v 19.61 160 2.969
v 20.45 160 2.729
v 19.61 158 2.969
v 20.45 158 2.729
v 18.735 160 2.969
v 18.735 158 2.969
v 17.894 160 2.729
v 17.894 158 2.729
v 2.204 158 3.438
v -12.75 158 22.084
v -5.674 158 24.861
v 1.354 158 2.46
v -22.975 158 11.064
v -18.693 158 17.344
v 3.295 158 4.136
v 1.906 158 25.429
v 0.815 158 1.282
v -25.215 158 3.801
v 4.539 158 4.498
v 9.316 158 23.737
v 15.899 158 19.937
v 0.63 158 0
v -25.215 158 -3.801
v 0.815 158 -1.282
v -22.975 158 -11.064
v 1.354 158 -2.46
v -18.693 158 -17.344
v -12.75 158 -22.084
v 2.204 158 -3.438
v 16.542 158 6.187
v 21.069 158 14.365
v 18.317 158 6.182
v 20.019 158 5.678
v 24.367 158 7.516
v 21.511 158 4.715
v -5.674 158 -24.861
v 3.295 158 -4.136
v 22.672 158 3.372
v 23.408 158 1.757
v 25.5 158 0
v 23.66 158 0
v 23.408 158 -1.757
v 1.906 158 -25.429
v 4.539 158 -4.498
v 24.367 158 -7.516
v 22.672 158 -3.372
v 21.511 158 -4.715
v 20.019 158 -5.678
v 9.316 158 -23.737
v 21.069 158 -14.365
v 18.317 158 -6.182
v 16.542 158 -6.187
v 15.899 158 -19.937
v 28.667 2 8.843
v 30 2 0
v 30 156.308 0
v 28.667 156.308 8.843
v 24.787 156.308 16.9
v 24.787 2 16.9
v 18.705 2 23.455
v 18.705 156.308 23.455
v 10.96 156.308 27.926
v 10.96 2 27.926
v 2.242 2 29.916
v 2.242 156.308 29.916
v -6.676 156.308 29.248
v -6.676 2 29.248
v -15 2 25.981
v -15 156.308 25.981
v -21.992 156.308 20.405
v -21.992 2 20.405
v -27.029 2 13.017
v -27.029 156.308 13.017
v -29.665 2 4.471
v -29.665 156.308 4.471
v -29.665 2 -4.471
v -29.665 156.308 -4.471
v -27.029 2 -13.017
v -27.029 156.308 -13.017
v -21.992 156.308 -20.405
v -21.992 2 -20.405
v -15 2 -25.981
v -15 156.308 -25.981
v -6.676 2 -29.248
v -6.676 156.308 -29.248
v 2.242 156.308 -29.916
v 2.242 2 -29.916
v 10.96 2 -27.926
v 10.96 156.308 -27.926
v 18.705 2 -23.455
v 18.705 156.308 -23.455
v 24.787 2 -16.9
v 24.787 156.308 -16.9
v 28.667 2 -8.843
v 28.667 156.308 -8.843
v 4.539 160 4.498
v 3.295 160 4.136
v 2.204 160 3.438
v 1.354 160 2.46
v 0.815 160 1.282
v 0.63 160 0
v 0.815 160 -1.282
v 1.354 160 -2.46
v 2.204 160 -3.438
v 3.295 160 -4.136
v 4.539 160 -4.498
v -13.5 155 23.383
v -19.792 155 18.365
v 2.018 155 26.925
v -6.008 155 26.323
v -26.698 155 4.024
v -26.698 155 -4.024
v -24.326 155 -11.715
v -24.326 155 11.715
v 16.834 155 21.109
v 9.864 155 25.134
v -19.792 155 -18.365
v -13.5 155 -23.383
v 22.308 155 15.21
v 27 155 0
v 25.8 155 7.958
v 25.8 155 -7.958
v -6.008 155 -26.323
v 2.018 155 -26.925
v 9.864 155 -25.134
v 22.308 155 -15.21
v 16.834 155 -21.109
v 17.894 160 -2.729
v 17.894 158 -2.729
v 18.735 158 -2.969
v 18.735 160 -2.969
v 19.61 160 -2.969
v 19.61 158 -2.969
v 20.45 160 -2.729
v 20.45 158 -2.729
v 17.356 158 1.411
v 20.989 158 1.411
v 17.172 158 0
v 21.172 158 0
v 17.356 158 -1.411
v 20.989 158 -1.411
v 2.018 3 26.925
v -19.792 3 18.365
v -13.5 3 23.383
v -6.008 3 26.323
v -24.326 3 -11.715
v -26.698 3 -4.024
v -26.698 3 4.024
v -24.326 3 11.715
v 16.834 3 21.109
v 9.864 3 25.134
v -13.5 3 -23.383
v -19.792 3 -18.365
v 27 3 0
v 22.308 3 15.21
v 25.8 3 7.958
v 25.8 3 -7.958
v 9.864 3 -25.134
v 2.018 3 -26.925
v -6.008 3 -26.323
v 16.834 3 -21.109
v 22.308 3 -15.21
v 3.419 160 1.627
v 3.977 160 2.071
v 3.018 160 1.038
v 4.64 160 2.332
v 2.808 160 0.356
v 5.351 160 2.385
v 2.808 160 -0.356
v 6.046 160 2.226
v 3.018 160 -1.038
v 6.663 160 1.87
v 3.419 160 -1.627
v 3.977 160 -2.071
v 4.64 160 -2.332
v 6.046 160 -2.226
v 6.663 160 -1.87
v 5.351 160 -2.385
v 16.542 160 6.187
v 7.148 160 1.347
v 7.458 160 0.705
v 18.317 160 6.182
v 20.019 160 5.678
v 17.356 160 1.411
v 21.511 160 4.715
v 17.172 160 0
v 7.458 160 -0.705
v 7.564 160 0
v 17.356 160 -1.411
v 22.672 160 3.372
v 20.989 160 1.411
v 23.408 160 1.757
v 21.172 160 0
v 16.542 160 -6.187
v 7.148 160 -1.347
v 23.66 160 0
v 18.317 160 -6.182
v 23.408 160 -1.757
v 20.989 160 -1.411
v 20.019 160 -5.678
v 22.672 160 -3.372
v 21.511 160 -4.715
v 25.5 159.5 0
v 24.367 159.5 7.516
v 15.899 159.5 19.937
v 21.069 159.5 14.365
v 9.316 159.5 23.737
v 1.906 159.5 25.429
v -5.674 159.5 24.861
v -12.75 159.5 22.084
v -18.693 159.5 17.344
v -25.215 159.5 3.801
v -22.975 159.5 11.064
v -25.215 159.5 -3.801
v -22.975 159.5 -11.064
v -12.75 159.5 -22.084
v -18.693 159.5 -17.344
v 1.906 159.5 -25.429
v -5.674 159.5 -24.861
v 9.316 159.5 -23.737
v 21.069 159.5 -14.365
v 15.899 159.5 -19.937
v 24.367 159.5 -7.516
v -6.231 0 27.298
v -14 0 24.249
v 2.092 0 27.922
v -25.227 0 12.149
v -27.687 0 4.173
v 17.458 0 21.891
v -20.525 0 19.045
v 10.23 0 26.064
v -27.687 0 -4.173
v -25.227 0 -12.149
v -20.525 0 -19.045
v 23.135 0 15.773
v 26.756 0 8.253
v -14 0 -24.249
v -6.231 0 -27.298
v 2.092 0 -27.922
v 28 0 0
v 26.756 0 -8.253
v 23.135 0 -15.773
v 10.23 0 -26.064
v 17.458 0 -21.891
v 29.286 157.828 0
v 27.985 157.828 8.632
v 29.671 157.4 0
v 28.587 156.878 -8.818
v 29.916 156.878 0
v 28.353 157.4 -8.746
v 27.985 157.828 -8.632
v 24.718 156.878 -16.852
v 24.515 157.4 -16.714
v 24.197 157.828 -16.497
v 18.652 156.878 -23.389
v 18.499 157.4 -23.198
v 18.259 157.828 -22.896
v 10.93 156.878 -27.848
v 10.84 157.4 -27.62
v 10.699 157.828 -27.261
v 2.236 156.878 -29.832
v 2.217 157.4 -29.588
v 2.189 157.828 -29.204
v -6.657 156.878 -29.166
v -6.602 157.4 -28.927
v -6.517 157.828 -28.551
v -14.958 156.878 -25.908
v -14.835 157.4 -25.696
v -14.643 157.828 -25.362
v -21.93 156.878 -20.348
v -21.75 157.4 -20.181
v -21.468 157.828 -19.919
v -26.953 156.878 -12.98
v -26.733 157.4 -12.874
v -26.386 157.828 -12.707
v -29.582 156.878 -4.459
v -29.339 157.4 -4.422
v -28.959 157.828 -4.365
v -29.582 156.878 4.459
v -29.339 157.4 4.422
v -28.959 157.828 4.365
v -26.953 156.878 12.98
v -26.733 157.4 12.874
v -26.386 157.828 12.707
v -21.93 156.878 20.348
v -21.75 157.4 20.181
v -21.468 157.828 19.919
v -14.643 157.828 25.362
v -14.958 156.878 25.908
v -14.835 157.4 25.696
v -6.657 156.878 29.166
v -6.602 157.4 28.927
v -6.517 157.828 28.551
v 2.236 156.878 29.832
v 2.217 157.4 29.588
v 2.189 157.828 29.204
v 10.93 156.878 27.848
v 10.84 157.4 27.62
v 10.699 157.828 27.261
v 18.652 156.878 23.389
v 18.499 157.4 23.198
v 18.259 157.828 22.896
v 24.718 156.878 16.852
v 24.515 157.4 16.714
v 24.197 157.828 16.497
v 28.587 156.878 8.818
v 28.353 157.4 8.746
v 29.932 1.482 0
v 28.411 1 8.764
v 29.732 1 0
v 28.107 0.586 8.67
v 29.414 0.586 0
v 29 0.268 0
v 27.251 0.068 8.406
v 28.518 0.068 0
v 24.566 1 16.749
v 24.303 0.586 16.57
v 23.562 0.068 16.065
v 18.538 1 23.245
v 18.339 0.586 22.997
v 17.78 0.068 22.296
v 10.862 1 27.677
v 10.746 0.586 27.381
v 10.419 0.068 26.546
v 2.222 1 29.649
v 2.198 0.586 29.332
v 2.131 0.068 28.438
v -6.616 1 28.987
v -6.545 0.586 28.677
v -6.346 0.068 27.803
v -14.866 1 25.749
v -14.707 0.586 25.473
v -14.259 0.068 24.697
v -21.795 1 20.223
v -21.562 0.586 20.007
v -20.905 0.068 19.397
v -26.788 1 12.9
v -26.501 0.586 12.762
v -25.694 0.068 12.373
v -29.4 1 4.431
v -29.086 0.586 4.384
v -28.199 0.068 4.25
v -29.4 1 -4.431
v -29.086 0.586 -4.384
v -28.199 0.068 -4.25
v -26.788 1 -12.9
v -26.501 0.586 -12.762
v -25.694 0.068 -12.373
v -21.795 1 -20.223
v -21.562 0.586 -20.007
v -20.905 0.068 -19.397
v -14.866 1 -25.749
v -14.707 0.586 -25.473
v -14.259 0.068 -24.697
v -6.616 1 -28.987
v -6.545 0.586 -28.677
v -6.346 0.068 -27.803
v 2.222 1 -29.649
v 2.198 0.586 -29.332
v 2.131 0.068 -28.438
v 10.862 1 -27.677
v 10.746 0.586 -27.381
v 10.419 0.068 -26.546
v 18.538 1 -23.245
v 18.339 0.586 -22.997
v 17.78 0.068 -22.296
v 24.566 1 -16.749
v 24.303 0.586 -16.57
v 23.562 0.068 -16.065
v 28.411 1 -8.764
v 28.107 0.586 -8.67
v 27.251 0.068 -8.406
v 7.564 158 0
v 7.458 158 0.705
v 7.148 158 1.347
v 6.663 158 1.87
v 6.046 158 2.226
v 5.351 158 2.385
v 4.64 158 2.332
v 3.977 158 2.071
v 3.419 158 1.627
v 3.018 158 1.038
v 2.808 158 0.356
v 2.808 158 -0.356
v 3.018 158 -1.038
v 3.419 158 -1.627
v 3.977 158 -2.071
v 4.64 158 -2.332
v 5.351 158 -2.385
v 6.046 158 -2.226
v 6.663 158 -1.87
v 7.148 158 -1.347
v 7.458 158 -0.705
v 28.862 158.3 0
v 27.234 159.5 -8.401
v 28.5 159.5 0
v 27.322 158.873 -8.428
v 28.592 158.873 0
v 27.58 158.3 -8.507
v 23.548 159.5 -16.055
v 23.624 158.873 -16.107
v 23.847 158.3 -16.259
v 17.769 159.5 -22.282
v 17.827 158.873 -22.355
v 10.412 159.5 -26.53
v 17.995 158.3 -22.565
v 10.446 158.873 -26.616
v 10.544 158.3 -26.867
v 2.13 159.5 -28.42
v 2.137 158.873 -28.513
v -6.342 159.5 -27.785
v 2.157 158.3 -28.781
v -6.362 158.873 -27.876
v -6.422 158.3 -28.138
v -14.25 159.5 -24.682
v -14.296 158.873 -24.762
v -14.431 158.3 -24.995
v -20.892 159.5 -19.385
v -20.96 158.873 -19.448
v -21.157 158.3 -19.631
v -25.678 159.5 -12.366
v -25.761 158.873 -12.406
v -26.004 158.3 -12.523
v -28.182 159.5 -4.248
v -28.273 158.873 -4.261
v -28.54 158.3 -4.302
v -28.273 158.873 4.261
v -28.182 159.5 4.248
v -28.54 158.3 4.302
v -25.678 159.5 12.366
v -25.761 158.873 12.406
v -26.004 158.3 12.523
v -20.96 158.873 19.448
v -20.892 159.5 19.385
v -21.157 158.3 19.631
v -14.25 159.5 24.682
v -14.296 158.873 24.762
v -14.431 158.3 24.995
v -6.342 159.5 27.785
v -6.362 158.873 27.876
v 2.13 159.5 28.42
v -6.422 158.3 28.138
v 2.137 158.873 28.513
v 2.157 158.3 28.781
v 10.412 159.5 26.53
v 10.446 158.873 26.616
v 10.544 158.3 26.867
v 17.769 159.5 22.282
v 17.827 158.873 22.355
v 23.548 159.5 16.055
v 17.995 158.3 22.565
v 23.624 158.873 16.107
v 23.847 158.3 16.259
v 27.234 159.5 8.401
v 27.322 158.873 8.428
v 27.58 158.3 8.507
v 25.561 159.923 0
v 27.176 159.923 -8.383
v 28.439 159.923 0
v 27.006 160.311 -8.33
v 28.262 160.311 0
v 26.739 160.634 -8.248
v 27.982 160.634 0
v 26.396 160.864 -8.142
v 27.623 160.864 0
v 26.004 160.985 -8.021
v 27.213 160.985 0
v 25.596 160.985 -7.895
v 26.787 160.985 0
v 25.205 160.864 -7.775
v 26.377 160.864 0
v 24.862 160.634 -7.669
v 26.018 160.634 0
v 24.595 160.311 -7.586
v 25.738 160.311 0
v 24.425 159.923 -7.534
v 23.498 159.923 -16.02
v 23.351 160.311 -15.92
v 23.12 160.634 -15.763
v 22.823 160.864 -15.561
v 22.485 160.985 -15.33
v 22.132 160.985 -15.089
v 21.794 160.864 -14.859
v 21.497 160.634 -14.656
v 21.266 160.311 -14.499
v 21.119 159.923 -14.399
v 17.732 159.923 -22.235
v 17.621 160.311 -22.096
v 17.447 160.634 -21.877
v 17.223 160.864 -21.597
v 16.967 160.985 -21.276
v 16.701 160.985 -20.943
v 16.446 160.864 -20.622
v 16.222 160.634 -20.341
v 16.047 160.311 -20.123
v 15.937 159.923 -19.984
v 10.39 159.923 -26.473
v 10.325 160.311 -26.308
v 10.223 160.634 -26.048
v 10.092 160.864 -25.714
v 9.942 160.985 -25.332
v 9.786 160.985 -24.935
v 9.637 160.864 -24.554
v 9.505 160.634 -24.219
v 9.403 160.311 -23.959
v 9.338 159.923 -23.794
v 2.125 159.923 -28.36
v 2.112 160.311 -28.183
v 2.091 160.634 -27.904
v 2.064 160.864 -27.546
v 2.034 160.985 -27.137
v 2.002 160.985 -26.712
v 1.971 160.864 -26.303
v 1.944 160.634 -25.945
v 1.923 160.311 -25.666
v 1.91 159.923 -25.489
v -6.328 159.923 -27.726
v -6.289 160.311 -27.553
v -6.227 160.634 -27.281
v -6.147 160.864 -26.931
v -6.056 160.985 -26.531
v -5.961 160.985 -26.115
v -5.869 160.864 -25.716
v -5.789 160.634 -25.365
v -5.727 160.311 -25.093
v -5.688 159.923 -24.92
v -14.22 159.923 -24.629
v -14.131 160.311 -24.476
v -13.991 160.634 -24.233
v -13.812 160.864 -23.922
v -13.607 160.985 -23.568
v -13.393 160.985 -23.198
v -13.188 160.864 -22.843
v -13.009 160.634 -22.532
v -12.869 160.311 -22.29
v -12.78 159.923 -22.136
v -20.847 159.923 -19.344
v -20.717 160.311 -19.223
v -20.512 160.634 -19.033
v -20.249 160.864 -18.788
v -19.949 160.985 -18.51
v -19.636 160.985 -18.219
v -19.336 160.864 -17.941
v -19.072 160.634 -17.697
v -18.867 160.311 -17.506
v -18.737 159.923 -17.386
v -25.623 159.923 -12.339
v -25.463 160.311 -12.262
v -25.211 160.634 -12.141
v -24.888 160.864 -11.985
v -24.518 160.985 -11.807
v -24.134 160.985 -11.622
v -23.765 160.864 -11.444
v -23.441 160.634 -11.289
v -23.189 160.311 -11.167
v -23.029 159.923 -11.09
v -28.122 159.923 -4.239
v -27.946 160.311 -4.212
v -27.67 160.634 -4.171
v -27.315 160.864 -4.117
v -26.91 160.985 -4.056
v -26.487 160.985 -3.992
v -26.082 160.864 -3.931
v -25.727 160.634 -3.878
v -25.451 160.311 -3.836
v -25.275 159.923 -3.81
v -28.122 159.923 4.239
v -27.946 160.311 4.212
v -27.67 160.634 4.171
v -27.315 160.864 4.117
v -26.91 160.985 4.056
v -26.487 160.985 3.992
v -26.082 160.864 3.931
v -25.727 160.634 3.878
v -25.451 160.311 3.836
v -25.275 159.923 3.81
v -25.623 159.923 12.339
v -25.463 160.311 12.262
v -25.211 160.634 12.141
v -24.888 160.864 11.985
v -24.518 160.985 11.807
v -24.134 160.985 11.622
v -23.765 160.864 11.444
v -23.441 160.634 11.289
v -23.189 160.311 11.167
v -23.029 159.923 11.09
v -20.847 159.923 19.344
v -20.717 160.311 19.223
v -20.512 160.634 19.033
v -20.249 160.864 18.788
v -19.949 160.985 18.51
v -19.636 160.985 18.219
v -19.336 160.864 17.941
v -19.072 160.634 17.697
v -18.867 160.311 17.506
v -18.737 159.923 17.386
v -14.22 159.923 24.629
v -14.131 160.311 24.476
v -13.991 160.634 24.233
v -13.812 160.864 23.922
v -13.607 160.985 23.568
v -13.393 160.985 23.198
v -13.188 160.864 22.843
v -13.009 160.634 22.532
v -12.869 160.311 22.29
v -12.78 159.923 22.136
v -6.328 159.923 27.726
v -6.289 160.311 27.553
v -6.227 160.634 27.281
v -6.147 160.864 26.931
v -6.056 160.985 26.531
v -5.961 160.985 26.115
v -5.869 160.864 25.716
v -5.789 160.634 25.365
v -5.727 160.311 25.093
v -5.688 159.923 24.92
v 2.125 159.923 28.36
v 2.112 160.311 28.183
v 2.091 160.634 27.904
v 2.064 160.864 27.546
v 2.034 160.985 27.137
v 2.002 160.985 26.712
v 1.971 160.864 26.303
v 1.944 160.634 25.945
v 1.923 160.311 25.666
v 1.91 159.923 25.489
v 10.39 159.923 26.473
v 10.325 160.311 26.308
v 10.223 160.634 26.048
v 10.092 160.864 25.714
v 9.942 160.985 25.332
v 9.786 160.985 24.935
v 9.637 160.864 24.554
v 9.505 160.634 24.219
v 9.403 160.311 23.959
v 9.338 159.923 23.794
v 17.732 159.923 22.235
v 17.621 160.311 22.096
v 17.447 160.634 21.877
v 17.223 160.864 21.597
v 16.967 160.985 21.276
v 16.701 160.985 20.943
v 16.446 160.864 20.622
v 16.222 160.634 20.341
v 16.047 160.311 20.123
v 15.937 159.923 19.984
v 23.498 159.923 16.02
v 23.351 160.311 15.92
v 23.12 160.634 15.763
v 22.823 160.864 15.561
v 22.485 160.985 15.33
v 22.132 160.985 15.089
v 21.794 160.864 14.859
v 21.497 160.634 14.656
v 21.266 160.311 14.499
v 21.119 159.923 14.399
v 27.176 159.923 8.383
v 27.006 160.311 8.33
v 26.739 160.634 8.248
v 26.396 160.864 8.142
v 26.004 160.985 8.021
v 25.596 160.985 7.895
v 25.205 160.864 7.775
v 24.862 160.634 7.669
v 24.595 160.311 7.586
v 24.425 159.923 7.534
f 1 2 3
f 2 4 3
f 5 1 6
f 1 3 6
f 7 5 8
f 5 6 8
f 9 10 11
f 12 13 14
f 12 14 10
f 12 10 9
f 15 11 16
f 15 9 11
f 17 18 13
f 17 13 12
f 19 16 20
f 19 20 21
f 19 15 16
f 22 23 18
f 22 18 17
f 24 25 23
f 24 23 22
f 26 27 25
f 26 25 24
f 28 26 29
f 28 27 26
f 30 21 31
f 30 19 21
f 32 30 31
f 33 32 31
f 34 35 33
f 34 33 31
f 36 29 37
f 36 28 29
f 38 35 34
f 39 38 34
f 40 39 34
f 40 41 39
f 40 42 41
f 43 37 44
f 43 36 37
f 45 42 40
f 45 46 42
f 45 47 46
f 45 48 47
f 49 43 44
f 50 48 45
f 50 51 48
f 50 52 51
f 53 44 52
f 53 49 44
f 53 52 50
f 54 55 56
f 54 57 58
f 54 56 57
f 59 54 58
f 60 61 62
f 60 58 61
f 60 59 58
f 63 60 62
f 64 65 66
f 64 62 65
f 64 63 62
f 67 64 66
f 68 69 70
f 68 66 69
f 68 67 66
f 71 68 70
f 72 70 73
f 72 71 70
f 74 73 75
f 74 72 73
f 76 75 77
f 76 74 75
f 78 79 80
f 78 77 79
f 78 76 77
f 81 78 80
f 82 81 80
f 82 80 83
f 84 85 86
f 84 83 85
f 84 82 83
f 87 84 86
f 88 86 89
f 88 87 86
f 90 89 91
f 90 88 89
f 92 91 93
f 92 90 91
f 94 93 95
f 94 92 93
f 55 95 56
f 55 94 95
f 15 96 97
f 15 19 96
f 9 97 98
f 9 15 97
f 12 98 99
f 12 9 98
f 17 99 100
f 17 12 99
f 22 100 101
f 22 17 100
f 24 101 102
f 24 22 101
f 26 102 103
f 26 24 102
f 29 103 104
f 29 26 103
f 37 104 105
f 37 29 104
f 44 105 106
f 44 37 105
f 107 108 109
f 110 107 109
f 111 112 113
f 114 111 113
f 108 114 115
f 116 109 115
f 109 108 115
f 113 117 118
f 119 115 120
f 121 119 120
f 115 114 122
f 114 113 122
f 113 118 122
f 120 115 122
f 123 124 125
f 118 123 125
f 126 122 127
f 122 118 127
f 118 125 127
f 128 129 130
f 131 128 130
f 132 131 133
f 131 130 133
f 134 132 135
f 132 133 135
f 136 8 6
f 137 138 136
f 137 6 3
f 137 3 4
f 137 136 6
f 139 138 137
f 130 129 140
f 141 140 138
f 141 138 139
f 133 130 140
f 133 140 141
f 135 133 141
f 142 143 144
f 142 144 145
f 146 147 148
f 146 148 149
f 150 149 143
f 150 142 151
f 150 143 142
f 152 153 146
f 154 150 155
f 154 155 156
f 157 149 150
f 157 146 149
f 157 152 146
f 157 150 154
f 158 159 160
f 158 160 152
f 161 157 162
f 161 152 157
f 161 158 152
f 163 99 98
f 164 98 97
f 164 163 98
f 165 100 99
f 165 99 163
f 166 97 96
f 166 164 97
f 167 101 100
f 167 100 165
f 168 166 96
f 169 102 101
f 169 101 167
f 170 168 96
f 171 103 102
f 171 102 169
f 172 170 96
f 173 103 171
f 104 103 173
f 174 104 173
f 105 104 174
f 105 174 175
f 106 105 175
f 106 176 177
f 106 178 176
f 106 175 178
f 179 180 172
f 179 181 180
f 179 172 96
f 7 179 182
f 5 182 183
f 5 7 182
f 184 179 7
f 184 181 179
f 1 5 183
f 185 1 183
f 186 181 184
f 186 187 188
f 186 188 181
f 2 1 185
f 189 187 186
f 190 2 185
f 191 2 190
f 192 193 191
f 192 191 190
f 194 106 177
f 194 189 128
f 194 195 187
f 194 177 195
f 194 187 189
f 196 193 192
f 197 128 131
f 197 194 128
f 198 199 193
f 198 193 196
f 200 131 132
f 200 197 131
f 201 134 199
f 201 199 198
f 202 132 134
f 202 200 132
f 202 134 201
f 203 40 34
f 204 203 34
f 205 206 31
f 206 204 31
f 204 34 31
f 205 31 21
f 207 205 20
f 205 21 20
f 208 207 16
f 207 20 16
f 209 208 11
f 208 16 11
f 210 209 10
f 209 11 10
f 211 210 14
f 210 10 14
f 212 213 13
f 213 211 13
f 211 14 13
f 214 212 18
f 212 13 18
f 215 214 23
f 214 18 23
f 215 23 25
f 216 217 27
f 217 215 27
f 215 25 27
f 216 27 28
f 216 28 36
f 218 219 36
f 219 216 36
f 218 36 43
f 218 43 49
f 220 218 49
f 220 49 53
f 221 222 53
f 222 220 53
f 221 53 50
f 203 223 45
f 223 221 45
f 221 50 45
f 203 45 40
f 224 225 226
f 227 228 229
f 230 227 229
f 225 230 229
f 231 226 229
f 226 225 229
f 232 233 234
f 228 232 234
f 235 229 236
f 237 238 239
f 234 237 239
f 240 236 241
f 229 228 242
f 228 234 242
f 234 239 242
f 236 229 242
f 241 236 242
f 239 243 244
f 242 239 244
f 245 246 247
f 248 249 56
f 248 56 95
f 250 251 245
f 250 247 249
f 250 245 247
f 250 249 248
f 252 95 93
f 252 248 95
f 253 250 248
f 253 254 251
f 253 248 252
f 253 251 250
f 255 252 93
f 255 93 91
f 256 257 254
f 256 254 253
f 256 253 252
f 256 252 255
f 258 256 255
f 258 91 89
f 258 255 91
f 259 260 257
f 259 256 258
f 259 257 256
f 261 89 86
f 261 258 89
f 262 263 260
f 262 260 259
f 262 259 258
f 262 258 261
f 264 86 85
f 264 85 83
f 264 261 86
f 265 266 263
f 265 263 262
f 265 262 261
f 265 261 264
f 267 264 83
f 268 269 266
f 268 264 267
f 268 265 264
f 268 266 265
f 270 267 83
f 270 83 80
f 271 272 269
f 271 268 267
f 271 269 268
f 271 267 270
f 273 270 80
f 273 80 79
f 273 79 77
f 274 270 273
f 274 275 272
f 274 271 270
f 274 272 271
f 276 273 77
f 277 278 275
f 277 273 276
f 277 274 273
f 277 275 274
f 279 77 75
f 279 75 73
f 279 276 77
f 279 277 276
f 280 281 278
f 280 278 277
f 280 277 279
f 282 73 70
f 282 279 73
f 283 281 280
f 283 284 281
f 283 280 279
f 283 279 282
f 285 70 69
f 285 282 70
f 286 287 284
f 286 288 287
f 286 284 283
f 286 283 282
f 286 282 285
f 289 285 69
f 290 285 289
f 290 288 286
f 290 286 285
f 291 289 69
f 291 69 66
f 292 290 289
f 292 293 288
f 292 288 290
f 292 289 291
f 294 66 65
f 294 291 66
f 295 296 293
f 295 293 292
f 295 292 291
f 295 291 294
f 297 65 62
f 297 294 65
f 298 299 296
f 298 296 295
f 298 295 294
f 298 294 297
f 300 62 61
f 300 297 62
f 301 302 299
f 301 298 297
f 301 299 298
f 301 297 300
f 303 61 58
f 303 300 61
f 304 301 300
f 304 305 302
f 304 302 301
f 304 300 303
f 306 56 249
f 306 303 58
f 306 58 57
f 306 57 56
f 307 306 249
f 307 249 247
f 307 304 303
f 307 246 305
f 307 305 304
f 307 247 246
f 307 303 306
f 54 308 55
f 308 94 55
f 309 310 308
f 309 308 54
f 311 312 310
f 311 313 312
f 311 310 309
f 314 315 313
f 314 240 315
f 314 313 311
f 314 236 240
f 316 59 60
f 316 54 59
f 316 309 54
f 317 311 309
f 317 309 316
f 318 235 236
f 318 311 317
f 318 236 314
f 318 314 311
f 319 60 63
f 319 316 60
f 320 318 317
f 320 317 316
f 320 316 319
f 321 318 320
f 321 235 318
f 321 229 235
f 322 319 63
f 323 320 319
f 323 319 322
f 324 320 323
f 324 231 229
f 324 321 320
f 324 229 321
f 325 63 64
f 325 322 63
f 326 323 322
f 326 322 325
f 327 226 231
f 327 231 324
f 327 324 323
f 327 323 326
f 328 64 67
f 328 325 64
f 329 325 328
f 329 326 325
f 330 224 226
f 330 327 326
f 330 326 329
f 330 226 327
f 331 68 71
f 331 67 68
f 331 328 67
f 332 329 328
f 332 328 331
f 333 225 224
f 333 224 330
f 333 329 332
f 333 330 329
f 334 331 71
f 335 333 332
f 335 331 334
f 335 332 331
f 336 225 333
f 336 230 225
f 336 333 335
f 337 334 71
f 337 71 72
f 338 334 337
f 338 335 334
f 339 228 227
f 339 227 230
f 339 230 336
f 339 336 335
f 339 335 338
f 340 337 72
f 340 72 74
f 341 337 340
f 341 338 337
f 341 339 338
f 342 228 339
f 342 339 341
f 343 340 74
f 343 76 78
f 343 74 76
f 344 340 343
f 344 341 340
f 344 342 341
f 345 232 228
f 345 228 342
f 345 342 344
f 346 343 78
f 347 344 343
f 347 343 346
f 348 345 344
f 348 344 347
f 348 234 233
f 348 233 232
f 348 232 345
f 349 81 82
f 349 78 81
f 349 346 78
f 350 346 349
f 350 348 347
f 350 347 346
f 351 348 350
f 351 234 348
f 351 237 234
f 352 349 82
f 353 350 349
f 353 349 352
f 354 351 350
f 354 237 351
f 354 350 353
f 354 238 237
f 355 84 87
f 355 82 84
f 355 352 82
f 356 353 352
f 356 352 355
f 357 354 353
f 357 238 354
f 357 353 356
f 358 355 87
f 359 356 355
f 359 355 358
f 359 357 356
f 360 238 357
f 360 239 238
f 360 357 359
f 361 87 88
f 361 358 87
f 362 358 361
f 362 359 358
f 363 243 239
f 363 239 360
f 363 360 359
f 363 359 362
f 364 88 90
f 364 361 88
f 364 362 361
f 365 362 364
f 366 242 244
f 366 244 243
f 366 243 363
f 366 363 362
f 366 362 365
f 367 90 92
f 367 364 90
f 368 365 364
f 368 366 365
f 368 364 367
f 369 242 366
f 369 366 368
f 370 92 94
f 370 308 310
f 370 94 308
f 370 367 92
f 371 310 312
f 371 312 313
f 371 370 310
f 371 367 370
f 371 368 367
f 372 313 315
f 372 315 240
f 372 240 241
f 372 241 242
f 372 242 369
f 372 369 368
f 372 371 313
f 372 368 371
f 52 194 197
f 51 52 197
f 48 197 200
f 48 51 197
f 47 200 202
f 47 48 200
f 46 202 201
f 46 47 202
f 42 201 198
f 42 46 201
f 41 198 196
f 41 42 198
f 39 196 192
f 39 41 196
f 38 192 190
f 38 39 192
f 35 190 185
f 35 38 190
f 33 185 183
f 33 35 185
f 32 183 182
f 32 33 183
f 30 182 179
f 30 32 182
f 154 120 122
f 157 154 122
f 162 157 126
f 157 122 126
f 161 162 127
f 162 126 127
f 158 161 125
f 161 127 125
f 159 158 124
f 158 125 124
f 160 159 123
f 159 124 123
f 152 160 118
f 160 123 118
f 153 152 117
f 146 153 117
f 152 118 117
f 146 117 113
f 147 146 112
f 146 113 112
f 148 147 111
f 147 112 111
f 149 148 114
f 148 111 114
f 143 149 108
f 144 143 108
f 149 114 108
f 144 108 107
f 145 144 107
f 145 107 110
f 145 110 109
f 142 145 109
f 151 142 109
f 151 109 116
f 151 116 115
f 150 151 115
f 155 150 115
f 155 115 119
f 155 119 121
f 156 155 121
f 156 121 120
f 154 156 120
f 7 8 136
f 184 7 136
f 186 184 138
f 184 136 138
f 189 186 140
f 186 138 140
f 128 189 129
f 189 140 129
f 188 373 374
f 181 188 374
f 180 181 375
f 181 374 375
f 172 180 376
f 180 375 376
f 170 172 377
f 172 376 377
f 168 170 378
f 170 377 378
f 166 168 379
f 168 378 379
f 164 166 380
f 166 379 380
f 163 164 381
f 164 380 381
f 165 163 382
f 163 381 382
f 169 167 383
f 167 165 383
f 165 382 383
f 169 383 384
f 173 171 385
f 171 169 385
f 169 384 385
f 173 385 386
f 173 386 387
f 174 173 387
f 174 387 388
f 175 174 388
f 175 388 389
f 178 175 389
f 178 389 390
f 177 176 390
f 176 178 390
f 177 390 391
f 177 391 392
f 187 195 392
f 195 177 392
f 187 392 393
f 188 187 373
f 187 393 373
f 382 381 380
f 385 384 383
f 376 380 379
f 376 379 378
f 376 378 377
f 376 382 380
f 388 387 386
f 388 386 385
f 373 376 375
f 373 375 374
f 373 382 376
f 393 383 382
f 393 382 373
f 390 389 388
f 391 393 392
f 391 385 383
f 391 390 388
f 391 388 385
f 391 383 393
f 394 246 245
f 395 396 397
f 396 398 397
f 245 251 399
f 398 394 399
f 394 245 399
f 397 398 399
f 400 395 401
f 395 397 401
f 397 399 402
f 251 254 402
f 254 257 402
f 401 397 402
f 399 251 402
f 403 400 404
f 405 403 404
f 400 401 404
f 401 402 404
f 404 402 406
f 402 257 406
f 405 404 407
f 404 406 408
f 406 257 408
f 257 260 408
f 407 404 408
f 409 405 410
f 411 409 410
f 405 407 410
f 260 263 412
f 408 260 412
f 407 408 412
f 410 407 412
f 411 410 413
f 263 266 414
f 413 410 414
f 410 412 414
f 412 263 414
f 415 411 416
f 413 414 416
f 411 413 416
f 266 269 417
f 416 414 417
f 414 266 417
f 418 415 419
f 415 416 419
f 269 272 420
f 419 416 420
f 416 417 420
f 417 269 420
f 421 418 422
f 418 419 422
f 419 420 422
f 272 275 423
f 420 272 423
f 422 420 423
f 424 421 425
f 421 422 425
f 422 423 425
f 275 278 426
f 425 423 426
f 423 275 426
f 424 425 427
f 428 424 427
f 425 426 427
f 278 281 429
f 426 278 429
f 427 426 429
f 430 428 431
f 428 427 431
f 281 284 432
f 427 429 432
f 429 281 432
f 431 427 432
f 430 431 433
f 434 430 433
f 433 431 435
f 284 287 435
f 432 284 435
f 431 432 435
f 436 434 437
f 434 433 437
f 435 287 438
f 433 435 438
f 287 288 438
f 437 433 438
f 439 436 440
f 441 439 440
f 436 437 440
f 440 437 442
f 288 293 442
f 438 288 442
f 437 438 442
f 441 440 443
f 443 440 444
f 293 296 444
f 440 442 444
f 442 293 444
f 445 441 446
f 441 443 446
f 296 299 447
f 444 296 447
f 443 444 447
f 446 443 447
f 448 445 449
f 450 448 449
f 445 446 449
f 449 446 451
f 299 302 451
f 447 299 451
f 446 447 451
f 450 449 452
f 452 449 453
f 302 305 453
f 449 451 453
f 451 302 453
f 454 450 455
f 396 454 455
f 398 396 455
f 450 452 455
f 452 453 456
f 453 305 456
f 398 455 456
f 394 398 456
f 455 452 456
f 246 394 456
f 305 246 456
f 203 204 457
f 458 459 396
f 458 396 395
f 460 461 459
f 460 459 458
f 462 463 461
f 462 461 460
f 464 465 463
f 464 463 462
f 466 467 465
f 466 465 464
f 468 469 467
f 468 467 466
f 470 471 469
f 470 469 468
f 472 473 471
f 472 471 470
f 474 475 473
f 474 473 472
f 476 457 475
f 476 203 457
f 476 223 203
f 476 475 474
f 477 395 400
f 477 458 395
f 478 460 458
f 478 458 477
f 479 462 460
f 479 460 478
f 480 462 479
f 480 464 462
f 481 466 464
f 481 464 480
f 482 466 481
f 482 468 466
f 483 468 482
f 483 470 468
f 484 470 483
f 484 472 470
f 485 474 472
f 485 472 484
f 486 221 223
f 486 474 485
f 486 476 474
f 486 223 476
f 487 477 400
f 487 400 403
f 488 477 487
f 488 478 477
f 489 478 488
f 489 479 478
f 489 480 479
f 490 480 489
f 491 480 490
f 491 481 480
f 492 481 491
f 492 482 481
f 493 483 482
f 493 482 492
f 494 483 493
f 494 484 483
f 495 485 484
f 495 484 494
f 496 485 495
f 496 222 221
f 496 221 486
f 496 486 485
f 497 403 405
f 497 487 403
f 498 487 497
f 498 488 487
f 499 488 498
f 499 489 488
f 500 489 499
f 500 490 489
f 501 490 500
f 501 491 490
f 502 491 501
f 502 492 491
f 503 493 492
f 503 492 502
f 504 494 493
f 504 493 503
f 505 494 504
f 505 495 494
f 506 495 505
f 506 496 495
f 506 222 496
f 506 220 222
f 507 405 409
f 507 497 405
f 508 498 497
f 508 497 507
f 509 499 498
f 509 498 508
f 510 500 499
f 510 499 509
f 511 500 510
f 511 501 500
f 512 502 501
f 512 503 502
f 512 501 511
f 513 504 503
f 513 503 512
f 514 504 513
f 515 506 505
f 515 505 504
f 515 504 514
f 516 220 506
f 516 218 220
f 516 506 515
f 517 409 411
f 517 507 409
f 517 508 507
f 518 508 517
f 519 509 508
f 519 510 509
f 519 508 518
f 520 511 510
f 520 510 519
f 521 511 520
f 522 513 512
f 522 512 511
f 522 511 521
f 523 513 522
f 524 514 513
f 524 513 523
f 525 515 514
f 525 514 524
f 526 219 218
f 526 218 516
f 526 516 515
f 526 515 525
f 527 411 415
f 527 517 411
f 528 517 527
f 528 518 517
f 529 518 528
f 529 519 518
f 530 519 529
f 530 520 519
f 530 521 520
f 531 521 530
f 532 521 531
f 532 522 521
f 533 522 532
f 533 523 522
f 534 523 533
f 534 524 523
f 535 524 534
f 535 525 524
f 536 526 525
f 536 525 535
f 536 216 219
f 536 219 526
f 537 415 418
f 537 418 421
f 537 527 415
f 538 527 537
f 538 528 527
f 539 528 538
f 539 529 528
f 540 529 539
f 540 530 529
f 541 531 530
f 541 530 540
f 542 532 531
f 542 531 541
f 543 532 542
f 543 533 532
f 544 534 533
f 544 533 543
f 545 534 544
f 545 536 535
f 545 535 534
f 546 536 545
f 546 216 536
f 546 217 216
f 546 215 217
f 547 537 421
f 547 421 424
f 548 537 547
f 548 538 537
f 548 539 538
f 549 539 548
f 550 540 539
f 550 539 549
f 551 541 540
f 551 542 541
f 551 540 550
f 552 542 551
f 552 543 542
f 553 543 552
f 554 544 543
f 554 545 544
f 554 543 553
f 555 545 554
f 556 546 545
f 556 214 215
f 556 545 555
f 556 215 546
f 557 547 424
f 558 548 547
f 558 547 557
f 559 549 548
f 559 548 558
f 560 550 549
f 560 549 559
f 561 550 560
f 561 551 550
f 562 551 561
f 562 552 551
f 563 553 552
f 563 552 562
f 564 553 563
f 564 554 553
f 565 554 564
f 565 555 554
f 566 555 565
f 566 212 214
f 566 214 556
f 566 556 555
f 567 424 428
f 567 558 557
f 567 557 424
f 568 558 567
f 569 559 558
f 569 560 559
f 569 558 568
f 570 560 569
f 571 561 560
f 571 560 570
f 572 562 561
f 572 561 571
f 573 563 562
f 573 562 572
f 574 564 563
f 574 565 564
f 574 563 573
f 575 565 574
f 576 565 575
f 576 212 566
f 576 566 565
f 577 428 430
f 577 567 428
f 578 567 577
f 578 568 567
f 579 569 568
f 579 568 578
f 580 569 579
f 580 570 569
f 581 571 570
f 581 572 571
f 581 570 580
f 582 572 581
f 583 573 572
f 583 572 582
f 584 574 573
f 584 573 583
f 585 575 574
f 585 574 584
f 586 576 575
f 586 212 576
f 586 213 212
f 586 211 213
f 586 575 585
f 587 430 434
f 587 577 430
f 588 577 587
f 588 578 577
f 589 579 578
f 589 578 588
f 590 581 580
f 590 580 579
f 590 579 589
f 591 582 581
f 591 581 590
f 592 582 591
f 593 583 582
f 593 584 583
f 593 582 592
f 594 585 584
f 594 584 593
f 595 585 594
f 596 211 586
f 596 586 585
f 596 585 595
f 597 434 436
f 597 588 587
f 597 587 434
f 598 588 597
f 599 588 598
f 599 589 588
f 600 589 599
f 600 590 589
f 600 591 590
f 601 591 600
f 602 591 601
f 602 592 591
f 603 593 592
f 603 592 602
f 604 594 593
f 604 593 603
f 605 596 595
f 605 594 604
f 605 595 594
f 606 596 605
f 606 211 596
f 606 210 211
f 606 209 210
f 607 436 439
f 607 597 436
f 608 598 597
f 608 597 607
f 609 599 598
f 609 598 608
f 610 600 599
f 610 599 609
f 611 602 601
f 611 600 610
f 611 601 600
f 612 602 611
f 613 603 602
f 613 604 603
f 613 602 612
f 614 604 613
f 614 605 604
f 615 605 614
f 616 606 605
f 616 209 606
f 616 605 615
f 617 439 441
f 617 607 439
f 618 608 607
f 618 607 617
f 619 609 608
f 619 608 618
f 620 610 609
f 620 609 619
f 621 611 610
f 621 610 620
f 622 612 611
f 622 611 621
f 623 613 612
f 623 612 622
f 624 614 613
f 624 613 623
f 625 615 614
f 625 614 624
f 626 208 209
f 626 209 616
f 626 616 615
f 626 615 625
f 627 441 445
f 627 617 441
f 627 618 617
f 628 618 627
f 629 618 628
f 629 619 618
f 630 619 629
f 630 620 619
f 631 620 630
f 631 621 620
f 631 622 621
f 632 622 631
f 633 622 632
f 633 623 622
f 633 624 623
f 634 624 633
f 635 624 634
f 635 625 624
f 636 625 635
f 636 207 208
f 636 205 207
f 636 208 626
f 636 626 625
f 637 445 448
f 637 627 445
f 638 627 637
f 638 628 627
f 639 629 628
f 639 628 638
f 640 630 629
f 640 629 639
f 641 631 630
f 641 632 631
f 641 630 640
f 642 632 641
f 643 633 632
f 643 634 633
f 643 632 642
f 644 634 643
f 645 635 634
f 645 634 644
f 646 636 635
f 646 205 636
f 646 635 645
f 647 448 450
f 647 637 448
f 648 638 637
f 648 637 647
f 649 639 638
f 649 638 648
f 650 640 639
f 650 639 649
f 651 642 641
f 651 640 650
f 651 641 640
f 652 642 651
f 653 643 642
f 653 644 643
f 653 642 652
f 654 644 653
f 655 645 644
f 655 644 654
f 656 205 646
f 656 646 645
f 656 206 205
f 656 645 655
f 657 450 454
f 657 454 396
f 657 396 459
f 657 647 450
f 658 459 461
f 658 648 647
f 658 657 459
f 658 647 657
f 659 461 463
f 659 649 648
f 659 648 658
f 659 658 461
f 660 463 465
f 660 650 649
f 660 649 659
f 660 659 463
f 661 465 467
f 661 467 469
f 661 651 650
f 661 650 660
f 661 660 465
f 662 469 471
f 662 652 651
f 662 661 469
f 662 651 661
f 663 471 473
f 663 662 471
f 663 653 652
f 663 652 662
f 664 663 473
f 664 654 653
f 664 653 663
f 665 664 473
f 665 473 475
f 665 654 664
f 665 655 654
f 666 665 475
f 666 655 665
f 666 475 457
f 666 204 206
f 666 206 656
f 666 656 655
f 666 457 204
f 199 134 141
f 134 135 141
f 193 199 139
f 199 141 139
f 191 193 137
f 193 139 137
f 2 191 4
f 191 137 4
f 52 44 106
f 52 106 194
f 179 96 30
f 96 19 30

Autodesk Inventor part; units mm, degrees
ref_plane "YZ Plane" through (0, 0, 0) normal (1, 0, 0) x (0, 1, 0)
ref_plane "XZ Plane" through (0, 0, 0) normal (0, 1, 0) x (-1, 0, 0)
ref_plane "XY Plane" through (0, 0, 0) normal (0, 0, 1) x (1, 0, 0)
sketch "Sketch1" plane through (0, 0, 0) normal (0, 0, 1) x (1, 0, 0)
  line L0 (30, 158) -> (30, 0) construction
  line L1 (0, 0) -> (0, 155)
  line L2 (0, 0) -> (30, 0)
  line L3 (30, 0) -> (0, 0) construction
  line L4 (0, 0) -> (0, 3) construction
  line L5 (0, 3) -> (27, 3)
  line L6 (27, 3) -> (27, 155)
  line L7 (27, 155) -> (0, 155)
  line L8 (0, 155) -> (0, 158)
  line L9 (0, 158) -> (30, 158) construction
  line L10 (27, 158) -> (27, 161) construction
  arc A0 (28.5, 159.5) -> (25.5, 159.5) centre (27, 159.5) ccw
  line L11 (28.5, 159.5) -> (28.5, 158) construction
  line L12 (25.5, 159.5) -> (25.5, 158)
  line L13 (27, 155) -> (27, 158) construction
  arc A1 (28.5, 159.5) -> (29.2857, 157.8283) centre (30.6712, 159.5) ccw
  arc A2 (30, 156.3085) -> (29.2857, 157.8283) centre (28.0261, 156.3085) ccw
  line L14 (25.5, 158) -> (0, 158)
  line L15 (30, 156.3085) -> (30, 0)
  point P0 (30, 79)
  dimension "d0" = 60
  dimension "d1" = 158
  dimension "d2" = 3
  dimension "d3" = 27
  dimension "d4" = 3
  dimension "d5" = 3
  dimension "d6" = 1.5
revolve "Revolution1" add sketch "Sketch1" angle 360 about axis through (0, 0, 0) along (0, 1, 0) contours L1 L5 L6 L7 L8 L14 L12 A0 A1 A2 L15 L2
fillet "Fillet1" radius 2 1 edges at (-30, 0, 0)
sketch "Sketch2" plane through (0, 158, 0) normal (0, 1, 0) x (1, 0, 0)
  circle A0 centre (0, 0) radius 25.5 construction
  circle A1 centre (5.1723, 0) radius 4.542 construction
  circle A2 centre (17.4125, 0) radius 6.2476 construction
  line L0 (4.5394, -4.4977) -> (16.5419, -6.1866)
  line L1 (4.5394, 4.4977) -> (16.5419, 6.1866)
  arc A3 (4.5394, 4.4977) -> (4.5394, -4.4977) centre (5.1723, 0) ccw
  arc A4 (16.5419, -6.1866) -> (16.5419, 6.1866) centre (17.4125, 0) ccw
  circle A5 centre (5.1723, 0) radius 2.3915
  arc A6 (19.1723, 4.25) -> (19.1723, -4.25) centre (22.6879, 0) ccw
  arc A7 (19.1723, -4.25) -> (19.1723, 4.25) centre (15.6567, 0) ccw
  arc A8 (17.8945, -2.7286) -> (20.4501, -2.7286) centre (19.1723, 0.1434) ccw
  arc A9 (20.4501, 2.7286) -> (17.8945, 2.7286) centre (19.1723, -0.1434) ccw
  line L2 (17.8945, -2.7286) -> (17.8945, 2.7286) construction
  line L3 (20.4501, -2.7286) -> (20.4501, 2.7286) construction
  line L4 (17.4125, 0) -> (5.1723, 0) construction
  line L5 (17.1723, 0) -> (21.1723, 0) construction
  point P0 (20.4501, 0)
  point P1 (19.1723, 3)
  point P2 (19.1723, -3)
  dimension "d9" = 12.4952
  dimension "d10" = 9.084
  dimension "d11" = 17.4125
  dimension "d12" = 5.1723
  dimension "d13" = 12.2402
  dimension "d14" = 8.5
  dimension "d15" = 16
  dimension "d16" = 6
  dimension "d17" = 4
  dimension "d18" = 3.1434
  dimension "d19" = 4.783
extrude "Extrusion1" add sketch "Sketch2" along normal blind 2 contours A3 L1 A4 L0 | A7 A9 A6 | A8 A7 A6
properties part number "the cup"
